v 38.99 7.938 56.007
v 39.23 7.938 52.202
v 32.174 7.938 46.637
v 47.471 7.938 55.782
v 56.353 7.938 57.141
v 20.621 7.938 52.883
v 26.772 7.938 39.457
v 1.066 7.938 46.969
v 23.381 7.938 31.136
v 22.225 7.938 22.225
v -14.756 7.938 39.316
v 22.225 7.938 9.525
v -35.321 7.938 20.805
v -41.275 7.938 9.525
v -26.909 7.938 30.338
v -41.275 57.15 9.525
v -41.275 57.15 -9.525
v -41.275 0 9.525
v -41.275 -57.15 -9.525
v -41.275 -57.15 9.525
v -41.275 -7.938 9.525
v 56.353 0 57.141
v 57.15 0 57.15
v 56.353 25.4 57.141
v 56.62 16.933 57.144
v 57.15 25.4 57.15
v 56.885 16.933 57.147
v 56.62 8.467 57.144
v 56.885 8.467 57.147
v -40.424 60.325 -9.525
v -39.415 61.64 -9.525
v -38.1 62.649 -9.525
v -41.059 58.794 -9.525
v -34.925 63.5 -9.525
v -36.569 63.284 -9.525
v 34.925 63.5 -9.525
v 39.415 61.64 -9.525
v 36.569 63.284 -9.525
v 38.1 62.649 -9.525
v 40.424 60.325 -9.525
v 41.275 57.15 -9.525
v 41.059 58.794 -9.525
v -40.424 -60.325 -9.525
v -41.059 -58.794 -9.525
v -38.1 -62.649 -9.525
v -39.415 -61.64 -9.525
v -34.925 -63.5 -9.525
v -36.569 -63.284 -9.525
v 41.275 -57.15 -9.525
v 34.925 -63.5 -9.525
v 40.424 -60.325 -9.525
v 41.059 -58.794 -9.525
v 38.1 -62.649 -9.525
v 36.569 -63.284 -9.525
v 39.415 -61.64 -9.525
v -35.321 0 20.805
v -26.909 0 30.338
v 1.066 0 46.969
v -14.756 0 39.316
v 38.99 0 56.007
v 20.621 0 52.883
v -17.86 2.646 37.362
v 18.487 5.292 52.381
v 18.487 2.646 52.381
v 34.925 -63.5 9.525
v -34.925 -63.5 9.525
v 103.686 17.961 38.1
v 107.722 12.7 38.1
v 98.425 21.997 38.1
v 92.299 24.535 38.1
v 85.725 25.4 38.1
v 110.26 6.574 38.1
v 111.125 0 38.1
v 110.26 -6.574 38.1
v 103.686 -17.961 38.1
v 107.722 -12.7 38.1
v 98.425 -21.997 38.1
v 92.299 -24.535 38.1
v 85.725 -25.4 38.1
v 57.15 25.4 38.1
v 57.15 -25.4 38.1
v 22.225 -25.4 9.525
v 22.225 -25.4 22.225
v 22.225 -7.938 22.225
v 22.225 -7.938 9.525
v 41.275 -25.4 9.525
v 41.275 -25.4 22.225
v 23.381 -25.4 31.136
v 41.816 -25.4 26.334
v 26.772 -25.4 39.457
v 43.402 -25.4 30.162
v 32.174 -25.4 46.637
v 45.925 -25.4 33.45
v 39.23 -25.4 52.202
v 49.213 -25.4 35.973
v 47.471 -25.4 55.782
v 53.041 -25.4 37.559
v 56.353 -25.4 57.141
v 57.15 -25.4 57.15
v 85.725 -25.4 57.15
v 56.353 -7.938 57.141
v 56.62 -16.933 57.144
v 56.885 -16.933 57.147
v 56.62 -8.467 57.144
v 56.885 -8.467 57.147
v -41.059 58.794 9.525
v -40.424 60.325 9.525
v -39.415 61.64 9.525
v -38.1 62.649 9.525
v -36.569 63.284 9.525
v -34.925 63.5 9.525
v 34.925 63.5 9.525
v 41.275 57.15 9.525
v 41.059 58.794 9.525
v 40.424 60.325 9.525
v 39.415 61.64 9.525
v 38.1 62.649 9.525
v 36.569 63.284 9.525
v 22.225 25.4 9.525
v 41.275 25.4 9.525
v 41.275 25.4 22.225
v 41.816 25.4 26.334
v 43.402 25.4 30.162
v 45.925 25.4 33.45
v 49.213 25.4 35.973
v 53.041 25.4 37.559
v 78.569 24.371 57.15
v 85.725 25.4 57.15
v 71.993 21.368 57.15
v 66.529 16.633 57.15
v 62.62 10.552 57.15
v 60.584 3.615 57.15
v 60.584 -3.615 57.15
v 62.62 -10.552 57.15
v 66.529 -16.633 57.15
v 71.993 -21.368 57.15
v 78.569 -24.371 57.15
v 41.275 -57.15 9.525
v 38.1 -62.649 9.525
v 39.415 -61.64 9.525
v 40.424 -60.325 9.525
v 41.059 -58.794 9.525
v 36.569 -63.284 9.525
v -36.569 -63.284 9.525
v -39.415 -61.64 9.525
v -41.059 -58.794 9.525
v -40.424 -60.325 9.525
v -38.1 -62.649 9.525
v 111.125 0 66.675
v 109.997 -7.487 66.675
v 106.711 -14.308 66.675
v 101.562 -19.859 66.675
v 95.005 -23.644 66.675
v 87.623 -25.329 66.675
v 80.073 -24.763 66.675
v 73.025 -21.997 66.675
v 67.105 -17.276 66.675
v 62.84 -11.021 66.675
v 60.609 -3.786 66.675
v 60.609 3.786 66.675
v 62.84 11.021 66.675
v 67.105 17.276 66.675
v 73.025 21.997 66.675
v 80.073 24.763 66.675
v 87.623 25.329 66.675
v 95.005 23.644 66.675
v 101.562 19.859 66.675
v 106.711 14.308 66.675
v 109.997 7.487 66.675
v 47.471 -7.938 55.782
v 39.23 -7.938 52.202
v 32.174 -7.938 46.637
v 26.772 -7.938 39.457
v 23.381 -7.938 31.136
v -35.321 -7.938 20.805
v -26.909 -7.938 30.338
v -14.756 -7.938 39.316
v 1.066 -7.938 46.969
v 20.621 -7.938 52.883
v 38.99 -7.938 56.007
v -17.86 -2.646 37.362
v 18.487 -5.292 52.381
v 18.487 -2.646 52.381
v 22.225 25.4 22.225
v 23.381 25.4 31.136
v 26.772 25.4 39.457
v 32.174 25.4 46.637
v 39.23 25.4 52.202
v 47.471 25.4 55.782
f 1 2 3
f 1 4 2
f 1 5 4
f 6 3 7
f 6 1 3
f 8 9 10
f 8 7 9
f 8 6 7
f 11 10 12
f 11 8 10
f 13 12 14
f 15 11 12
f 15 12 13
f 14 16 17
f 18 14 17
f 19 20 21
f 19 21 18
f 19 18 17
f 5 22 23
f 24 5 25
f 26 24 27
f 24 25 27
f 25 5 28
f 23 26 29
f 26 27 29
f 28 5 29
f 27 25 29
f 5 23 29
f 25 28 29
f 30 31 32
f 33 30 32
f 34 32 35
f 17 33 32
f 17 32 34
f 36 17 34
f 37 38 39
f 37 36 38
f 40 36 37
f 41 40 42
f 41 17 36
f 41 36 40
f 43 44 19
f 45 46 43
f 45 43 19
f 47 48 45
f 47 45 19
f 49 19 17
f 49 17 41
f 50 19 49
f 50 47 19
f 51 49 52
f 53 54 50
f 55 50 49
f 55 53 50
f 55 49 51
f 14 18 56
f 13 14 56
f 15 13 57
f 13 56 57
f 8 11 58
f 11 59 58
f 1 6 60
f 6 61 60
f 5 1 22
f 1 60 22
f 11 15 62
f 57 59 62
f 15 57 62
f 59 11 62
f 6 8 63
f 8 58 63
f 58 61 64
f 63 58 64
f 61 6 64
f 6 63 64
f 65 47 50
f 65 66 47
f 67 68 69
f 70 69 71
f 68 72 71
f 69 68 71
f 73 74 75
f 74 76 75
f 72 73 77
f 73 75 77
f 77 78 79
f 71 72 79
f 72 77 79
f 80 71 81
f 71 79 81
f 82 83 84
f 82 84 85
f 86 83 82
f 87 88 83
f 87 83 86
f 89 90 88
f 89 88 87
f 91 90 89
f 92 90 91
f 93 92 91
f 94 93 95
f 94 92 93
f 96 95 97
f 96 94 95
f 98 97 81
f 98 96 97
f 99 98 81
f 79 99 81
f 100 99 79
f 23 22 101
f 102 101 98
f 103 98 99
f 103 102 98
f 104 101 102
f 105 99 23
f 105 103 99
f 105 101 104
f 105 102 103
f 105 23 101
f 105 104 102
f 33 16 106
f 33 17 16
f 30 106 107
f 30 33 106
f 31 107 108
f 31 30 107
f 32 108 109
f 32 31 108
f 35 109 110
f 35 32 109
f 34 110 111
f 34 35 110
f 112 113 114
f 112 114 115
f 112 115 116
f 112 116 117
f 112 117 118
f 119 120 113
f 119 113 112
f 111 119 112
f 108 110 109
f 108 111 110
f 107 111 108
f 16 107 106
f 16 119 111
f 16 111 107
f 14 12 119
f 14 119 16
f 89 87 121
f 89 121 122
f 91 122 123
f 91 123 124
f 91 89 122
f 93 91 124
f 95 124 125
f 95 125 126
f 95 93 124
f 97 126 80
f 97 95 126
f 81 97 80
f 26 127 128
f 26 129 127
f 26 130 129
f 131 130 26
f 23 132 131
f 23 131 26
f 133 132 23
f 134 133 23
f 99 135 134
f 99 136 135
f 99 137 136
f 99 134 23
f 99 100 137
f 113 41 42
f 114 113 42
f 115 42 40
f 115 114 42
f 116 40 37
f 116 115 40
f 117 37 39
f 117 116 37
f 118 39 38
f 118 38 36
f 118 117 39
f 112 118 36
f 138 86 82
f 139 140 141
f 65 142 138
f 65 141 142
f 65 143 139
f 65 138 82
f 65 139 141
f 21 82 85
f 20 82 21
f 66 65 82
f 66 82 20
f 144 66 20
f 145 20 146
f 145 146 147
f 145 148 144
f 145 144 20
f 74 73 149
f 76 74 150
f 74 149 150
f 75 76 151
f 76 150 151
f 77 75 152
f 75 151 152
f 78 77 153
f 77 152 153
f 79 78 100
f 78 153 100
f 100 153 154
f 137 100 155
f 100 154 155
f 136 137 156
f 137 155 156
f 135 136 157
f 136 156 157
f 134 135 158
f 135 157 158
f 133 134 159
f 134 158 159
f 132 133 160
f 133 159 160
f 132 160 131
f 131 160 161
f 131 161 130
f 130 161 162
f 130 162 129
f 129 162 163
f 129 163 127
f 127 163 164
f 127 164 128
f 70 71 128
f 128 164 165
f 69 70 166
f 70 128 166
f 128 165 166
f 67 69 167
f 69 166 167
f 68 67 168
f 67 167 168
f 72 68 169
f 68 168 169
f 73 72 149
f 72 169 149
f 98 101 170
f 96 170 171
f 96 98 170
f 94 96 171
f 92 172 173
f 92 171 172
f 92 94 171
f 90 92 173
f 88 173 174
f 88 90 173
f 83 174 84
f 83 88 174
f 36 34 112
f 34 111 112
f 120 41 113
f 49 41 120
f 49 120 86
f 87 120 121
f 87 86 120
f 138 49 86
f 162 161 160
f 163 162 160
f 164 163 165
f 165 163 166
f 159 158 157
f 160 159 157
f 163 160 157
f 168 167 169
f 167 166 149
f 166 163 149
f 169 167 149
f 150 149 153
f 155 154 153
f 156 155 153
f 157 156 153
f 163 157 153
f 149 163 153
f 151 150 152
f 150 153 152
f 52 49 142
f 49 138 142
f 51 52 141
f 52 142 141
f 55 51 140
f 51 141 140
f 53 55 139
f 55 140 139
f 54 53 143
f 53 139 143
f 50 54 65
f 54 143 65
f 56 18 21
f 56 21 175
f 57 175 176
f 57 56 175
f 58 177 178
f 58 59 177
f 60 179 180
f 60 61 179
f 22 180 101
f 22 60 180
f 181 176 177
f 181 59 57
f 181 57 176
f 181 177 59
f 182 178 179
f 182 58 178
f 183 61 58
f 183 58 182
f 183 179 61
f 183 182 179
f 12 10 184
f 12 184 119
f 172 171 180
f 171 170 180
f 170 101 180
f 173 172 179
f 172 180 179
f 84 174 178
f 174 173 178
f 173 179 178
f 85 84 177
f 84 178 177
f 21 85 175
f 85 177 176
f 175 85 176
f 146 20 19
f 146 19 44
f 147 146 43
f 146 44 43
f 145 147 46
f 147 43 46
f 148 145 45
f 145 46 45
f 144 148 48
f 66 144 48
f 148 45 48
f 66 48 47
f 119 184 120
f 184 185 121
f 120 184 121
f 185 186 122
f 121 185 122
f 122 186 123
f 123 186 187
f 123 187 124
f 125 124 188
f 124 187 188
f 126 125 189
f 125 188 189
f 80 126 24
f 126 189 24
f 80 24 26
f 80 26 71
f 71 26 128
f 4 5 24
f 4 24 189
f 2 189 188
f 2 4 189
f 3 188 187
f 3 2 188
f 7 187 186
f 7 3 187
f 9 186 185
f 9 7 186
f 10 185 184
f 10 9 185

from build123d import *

# Parameters (mm, degrees)
F1_DEPTH = 63.5
F2_DEPTH = 7.9375
F3_DEPTH = 25.4
F5_R     = 6.35


with BuildPart() as f1:
    # F0 (on Front) → F1 (new body, symmetric)
    with BuildSketch(Plane.XZ):
        Polygon((-41.275, -9.525), (41.275, -9.525), (41.275, 9.525), (22.225, 9.525), (-41.275, 9.525), align=None)
    extrude(amount=F1_DEPTH, both=True)

    # F0 (on Front) → F2 (join, symmetric)
    with BuildSketch(Plane.XZ):
        with BuildLine():
            add(Edge.make_bspline(
                [(-41.275, 9.525), (-28.1295553006, 44.6239538406), (21.5320084104, 56.6569118674), (56.3533917414, 57.1409138543)],
                knots=[0, 0, 0, 0, 108.5115602051, 108.5115602051, 108.5115602051, 108.5115602051], degree=3))
            Line((-41.275, 9.525), (22.225, 9.525))
            Line((22.225, 9.525), (22.225, 22.225))
            ThreePointArc((22.225, 22.225), (32.1742400673, 46.6374361911), (56.3533917414, 57.1409138543))
        make_face()
    extrude(amount=F2_DEPTH, both=True)

    # F0 (on Front) → F3 (join, symmetric)
    with BuildSketch(Plane.XZ):
        with BuildLine():
            Line((22.225, 9.525), (41.275, 9.525))
            Line((41.275, 9.525), (41.275, 22.225))
            ThreePointArc((41.275, 22.225), (45.9246798487, 33.4503201513), (57.15, 38.1))
            Line((57.15, 38.1), (60.325, 38.1))
            Line((60.325, 38.1), (60.325, 57.15))
            Line((60.325, 57.15), (57.15, 57.15))
            add(Edge.make_bspline(
                [(56.3533917414, 57.1409138543), (56.6198041666, 57.1446168704), (56.8853479194, 57.1476438664), (57.15, 57.15)],
                knots=[108.5115602051, 108.5115602051, 108.5115602051, 108.5115602051, 109.3417635215, 109.3417635215, 109.3417635215, 109.3417635215], degree=3))
            ThreePointArc((56.3533917414, 57.1409138543), (32.1742400673, 46.6374361911), (22.225, 22.225))
            Line((22.225, 22.225), (22.225, 9.525))
        make_face()
        Polygon((60.325, 57.15), (60.325, 38.1), (80.6127000995, 38.1), (85.725, 38.1), (85.725, 57.15), (80.6127000995, 57.15), align=None)
    extrude(amount=F3_DEPTH, both=True)

    # F0 (on Front) → F4 (revolve)
    with BuildSketch(Plane.XZ):
        Polygon((85.725, 57.15), (85.725, 38.1), (111.125, 38.1), (111.125, 66.675), (85.725, 66.675), align=None)
    revolve(axis=Axis((85.725, 0, 52.3875), (0, 0, -1)))

    # F5
    f5_edges = [f1.edges().sort_by_distance(p)[0] for p in [
        (41.275, -63.5, 0),
        (-41.275, -63.5, 0),
        (-41.275, 63.5, 0),
        (41.275, 63.5, 0),
    ]]
    fillet(f5_edges, radius=F5_R)


solid = f1.part
